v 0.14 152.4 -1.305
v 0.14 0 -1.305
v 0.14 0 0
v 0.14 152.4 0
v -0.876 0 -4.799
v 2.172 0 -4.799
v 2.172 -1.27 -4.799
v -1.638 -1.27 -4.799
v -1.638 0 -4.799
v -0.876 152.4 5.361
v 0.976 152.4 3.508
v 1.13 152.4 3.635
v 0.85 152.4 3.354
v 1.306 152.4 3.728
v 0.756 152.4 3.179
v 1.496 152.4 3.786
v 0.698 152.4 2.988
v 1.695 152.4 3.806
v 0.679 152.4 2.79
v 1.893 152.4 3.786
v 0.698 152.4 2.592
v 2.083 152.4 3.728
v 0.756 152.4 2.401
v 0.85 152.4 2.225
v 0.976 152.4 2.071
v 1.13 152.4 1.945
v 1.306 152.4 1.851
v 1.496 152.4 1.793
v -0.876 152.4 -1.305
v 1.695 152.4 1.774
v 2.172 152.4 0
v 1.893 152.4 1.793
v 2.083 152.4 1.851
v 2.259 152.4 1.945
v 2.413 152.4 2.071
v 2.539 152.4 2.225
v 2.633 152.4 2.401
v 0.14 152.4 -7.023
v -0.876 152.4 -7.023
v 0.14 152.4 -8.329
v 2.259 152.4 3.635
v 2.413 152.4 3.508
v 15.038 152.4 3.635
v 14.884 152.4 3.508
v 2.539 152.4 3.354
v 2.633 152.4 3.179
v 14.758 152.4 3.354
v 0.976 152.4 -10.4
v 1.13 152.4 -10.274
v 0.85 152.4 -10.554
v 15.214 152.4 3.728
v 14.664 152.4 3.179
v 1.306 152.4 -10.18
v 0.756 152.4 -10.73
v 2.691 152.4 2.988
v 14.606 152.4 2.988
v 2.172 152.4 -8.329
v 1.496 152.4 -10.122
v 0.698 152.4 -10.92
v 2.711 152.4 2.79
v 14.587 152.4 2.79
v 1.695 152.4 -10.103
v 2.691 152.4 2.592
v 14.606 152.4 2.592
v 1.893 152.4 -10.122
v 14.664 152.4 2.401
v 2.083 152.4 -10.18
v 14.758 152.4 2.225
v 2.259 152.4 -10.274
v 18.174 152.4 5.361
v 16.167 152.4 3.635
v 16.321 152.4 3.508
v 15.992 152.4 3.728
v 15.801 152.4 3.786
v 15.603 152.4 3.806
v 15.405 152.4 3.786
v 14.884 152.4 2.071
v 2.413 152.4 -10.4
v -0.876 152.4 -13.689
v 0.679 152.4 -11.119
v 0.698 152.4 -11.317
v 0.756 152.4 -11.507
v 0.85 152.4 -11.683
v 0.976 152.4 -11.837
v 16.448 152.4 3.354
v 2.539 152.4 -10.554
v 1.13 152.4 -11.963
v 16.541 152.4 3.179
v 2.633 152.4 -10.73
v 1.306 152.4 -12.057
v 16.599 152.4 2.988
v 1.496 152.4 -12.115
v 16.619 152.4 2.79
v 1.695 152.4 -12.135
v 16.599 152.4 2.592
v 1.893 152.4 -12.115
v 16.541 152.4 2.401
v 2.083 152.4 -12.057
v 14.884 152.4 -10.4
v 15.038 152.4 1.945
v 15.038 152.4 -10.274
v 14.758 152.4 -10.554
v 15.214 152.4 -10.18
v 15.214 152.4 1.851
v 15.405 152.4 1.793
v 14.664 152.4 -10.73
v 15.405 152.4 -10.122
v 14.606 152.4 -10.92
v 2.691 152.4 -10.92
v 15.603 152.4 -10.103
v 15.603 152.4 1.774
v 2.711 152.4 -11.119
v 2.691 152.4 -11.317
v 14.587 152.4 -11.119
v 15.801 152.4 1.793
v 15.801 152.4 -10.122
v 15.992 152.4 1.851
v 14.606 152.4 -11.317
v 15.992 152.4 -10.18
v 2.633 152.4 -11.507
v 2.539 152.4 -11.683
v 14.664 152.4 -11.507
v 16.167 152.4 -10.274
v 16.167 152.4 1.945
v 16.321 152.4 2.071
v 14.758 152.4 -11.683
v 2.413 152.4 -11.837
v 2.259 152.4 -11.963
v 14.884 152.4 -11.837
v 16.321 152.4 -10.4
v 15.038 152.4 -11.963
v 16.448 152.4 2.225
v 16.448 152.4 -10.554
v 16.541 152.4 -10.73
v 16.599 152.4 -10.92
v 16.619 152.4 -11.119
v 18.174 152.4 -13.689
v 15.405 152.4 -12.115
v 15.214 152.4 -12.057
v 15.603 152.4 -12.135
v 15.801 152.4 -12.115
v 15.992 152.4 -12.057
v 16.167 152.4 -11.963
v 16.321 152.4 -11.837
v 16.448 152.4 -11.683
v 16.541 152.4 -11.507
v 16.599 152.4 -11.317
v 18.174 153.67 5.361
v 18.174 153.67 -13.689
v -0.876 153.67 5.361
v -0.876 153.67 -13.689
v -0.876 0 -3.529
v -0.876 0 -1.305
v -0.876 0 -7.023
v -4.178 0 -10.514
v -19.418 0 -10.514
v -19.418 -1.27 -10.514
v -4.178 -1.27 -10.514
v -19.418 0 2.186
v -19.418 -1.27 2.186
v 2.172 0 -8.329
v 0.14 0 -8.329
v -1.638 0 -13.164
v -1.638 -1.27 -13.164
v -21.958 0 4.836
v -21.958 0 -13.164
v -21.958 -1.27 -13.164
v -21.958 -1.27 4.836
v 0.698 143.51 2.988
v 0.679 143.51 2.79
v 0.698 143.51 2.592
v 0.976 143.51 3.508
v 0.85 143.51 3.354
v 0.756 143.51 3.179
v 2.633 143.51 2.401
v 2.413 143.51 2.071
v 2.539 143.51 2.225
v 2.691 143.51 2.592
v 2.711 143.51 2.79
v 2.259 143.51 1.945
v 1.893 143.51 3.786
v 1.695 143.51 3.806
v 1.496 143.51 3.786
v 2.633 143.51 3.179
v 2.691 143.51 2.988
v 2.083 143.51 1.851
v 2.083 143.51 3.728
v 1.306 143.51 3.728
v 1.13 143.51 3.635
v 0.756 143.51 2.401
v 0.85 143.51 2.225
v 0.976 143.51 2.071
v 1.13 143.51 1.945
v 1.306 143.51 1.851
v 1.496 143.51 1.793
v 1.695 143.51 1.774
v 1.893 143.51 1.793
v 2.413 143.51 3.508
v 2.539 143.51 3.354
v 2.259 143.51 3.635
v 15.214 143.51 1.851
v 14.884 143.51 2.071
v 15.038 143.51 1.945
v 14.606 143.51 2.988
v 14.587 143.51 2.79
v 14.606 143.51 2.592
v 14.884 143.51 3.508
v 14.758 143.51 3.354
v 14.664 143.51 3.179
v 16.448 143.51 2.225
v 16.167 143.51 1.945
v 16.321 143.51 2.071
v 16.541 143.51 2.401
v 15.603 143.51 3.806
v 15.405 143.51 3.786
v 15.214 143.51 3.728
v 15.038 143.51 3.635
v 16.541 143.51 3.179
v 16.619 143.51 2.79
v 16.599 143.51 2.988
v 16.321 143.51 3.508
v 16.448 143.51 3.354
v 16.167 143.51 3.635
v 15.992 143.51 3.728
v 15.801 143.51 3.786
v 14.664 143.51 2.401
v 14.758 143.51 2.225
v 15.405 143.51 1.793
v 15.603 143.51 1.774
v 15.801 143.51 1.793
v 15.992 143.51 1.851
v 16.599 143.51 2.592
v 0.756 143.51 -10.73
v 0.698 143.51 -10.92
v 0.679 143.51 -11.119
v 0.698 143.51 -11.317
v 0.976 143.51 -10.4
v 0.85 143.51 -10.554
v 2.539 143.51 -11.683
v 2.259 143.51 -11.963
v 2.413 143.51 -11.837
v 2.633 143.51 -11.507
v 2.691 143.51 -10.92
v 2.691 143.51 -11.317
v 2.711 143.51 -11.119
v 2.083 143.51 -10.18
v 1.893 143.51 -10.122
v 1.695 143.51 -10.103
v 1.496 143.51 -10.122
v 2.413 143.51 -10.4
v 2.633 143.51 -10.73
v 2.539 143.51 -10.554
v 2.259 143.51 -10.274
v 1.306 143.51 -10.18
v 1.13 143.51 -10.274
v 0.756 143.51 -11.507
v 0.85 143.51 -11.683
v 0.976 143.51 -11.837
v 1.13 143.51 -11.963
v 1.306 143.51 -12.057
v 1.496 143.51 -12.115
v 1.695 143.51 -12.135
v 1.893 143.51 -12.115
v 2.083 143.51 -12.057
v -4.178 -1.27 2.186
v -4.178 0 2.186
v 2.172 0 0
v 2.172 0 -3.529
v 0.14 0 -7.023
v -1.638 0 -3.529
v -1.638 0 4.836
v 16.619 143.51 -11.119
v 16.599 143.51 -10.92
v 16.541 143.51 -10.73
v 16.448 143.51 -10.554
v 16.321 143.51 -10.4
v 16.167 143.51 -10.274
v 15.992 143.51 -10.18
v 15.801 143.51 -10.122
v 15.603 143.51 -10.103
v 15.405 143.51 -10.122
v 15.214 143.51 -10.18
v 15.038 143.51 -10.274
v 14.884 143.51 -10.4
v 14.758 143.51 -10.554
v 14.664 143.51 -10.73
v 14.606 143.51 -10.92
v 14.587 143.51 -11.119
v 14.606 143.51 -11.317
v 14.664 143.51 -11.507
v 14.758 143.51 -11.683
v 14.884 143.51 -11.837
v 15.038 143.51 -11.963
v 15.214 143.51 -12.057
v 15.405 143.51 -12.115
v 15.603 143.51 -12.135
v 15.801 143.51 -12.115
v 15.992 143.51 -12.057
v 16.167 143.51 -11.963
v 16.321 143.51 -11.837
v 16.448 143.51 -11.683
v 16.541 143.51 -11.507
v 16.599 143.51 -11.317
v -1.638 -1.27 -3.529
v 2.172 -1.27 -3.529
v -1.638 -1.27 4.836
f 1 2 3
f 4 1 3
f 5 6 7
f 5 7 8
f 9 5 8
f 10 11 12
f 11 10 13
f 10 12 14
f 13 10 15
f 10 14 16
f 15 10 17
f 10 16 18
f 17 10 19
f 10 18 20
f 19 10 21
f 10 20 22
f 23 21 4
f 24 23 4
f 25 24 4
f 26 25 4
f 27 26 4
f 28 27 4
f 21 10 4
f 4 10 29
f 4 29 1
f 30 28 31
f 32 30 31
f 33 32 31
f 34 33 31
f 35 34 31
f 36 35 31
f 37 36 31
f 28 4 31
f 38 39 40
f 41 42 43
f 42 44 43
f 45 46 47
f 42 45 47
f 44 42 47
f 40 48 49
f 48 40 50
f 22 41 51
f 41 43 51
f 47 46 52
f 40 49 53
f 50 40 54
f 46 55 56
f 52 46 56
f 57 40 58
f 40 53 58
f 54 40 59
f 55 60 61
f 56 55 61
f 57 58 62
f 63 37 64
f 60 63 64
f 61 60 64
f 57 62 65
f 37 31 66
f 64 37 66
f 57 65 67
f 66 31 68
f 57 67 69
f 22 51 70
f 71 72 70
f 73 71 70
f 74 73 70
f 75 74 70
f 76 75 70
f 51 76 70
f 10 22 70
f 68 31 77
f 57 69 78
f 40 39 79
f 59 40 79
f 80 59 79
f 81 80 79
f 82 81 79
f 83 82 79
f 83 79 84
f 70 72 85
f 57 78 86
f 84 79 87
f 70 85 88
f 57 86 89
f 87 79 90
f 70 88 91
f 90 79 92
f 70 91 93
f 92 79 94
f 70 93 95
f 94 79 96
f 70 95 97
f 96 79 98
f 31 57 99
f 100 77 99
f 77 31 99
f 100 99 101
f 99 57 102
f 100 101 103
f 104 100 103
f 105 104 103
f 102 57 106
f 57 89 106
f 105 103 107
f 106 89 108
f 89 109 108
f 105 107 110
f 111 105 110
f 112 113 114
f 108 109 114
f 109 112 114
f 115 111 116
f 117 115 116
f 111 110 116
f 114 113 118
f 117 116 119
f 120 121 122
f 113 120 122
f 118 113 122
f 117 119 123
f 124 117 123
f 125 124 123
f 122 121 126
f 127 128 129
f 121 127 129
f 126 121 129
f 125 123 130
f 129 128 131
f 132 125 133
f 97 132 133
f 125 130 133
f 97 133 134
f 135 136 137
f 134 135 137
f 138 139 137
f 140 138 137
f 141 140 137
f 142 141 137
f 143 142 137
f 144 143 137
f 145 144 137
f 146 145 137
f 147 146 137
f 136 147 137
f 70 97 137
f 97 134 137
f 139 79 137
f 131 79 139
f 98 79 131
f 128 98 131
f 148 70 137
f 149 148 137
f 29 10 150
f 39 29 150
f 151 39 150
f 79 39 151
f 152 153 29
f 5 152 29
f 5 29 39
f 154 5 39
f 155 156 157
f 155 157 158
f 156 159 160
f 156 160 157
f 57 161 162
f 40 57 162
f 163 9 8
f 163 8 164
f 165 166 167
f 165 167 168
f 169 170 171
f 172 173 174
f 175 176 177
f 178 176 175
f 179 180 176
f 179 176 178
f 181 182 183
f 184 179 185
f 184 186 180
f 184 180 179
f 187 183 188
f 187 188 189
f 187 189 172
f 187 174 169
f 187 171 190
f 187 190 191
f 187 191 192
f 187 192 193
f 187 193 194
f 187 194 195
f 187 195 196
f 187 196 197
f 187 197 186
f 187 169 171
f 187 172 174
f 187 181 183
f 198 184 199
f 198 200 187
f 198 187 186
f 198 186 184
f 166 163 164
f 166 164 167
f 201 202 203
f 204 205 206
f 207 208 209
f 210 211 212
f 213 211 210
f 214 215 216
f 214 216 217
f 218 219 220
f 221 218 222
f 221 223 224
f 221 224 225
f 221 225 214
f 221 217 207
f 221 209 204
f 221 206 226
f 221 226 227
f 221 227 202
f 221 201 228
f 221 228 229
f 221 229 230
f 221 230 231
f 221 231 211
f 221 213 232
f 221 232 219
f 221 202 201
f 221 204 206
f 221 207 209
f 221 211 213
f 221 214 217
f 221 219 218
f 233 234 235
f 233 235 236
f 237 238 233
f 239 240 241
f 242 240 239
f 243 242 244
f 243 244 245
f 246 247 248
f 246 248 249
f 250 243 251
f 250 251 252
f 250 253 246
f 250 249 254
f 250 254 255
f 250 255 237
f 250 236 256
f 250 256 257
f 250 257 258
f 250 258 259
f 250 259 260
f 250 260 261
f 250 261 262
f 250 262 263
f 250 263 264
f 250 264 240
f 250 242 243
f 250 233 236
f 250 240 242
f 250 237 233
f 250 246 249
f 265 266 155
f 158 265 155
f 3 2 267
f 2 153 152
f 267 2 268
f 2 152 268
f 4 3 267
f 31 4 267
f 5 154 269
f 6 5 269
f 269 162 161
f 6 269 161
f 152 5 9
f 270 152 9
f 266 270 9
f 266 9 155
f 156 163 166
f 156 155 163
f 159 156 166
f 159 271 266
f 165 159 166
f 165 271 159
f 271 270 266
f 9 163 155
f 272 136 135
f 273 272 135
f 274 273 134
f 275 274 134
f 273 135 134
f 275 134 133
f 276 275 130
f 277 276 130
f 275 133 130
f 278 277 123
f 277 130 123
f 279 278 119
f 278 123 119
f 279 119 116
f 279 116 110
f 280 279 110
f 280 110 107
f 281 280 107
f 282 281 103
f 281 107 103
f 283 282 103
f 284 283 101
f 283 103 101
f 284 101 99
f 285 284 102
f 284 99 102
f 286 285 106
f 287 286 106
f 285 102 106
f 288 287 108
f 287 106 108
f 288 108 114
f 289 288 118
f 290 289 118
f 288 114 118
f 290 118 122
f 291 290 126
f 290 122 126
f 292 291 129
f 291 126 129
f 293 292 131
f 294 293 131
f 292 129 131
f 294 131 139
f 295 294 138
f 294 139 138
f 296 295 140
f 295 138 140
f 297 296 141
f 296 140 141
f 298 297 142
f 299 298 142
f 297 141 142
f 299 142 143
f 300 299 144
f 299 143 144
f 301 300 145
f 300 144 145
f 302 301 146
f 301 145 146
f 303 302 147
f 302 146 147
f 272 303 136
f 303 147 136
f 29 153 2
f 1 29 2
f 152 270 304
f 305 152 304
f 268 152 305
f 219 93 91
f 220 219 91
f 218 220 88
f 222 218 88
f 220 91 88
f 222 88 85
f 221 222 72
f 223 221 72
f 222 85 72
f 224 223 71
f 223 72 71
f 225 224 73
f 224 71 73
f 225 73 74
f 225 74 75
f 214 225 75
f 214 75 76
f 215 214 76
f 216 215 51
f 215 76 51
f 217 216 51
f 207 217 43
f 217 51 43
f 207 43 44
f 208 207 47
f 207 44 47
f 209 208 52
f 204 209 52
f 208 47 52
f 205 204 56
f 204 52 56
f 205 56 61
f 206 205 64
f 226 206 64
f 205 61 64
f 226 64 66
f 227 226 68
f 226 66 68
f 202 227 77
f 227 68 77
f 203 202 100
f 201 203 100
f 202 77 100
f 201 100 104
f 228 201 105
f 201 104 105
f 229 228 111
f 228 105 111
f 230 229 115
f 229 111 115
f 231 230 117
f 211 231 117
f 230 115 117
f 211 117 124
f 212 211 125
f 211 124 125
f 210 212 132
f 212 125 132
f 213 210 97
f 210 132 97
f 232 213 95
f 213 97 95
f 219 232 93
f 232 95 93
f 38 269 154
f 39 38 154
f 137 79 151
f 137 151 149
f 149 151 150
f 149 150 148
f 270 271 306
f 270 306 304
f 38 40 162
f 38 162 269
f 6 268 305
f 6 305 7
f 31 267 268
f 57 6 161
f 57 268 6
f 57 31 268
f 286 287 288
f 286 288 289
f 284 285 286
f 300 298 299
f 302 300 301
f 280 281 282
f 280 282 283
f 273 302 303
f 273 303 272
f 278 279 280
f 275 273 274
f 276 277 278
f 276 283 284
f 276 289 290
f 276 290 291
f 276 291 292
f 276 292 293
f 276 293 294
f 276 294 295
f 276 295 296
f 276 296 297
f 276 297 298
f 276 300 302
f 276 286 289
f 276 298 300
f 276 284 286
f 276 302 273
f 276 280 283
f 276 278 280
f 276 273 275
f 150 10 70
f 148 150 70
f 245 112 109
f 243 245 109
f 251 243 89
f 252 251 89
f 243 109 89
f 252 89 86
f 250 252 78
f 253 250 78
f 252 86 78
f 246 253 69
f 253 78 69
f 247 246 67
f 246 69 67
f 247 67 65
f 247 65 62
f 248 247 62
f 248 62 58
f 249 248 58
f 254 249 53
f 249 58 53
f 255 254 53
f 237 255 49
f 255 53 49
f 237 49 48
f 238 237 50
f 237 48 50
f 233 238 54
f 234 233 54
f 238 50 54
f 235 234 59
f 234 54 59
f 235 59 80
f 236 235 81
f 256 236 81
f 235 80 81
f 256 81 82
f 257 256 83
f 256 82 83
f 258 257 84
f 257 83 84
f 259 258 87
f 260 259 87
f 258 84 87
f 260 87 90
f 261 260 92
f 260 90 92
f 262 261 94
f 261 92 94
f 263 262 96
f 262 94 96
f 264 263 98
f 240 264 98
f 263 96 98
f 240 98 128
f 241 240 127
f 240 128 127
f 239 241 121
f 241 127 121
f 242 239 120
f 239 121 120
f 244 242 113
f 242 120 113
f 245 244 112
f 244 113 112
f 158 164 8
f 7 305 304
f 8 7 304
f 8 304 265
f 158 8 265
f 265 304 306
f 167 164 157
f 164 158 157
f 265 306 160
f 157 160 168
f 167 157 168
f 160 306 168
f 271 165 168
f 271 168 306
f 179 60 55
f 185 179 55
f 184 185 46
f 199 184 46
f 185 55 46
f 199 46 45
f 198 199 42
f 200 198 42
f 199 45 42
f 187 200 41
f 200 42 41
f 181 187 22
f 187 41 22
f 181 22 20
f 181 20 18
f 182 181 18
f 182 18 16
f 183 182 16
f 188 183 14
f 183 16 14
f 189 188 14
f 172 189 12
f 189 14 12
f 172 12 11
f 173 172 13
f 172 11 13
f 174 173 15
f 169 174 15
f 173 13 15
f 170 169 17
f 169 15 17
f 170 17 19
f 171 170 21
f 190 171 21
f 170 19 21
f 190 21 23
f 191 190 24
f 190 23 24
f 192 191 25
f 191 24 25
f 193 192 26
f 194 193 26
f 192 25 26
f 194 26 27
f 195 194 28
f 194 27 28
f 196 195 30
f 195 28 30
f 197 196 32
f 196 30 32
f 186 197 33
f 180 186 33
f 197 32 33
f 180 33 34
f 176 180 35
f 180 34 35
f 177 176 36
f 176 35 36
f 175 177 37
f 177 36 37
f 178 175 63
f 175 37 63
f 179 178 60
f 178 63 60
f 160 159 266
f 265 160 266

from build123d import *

# Parameters (mm, degrees)
BOSS_EXTRUDE1_DEPTH = 152.4
SKETCH2_W           = 19.05
SKETCH2_H           = 19.05
BOSS_EXTRUDE2_DEPTH = 1.27
SKETCH3_R           = 1.016
BOSS_EXTRUDE3_DEPTH = 8.89
BOSS_EXTRUDE4_DEPTH = 1.27
SKETCH5_W           = 15.24
SKETCH5_H           = 12.7
CUT_EXTRUDE1_DEPTH  = 2.27


with BuildPart() as part:
    # Sketch1 → Boss-Extrude1 (new body)
    with BuildSketch(Plane(origin=(0, 0, 0), x_dir=(1, 0, 0), z_dir=(0, 1, 0))):
        Polygon((0.1397, 7.023481), (-0.8763, 7.023481), (-0.8763, 1.305306), (0.1397, 1.305306), (0.1397, 0), (2.1717, 0), (2.1717, 8.328787), (0.1397, 8.328787), align=None)
    extrude(amount=BOSS_EXTRUDE1_DEPTH)

    # Sketch2 → Boss-Extrude2 (add)
    with BuildSketch(Plane(origin=(0, 152.4, 0), x_dir=(1, 0, 0), z_dir=(0, 1, 0))):
        with Locations((8.6487, 4.1643935)):
            Rectangle(SKETCH2_W, SKETCH2_H)
    extrude(amount=BOSS_EXTRUDE2_DEPTH)

    # Sketch3 → Boss-Extrude3 (add)
    with BuildSketch(Plane.XZ.offset(-152.4)):
        with Locations((15.602834065, 2.789740565)):
            Circle(SKETCH3_R)
        with Locations((15.602834065, -11.118527565)):
            Circle(SKETCH3_R)
        with Locations((1.694565935, -11.118527565)):
            Circle(SKETCH3_R)
        with Locations((1.694565935, 2.789740565)):
            Circle(SKETCH3_R)
    extrude(amount=BOSS_EXTRUDE3_DEPTH)

    # Sketch4 → Boss-Extrude4 (add)
    with BuildSketch(Plane.XZ):
        Polygon((-21.9583, 4.8356065), (-1.6383, 4.8356065), (-1.6383, -3.5293935), (2.1717, -3.5293935), (2.1717, -4.7993935), (-1.6383, -4.7993935), (-1.6383, -13.1643935), (-21.9583, -13.1643935), align=None)
    extrude(amount=BOSS_EXTRUDE4_DEPTH)

    # Sketch5 → Cut-Extrude1 (cut, through all)
    with BuildSketch(Plane(origin=(0, 0, 0), x_dir=(1, 0, 0), z_dir=(0, 1, 0))):
        with Locations((-11.7983, 4.1643935)):
            Rectangle(SKETCH5_W, SKETCH5_H)
    extrude(amount=-CUT_EXTRUDE1_DEPTH, mode=Mode.SUBTRACT)


solid = part.part
